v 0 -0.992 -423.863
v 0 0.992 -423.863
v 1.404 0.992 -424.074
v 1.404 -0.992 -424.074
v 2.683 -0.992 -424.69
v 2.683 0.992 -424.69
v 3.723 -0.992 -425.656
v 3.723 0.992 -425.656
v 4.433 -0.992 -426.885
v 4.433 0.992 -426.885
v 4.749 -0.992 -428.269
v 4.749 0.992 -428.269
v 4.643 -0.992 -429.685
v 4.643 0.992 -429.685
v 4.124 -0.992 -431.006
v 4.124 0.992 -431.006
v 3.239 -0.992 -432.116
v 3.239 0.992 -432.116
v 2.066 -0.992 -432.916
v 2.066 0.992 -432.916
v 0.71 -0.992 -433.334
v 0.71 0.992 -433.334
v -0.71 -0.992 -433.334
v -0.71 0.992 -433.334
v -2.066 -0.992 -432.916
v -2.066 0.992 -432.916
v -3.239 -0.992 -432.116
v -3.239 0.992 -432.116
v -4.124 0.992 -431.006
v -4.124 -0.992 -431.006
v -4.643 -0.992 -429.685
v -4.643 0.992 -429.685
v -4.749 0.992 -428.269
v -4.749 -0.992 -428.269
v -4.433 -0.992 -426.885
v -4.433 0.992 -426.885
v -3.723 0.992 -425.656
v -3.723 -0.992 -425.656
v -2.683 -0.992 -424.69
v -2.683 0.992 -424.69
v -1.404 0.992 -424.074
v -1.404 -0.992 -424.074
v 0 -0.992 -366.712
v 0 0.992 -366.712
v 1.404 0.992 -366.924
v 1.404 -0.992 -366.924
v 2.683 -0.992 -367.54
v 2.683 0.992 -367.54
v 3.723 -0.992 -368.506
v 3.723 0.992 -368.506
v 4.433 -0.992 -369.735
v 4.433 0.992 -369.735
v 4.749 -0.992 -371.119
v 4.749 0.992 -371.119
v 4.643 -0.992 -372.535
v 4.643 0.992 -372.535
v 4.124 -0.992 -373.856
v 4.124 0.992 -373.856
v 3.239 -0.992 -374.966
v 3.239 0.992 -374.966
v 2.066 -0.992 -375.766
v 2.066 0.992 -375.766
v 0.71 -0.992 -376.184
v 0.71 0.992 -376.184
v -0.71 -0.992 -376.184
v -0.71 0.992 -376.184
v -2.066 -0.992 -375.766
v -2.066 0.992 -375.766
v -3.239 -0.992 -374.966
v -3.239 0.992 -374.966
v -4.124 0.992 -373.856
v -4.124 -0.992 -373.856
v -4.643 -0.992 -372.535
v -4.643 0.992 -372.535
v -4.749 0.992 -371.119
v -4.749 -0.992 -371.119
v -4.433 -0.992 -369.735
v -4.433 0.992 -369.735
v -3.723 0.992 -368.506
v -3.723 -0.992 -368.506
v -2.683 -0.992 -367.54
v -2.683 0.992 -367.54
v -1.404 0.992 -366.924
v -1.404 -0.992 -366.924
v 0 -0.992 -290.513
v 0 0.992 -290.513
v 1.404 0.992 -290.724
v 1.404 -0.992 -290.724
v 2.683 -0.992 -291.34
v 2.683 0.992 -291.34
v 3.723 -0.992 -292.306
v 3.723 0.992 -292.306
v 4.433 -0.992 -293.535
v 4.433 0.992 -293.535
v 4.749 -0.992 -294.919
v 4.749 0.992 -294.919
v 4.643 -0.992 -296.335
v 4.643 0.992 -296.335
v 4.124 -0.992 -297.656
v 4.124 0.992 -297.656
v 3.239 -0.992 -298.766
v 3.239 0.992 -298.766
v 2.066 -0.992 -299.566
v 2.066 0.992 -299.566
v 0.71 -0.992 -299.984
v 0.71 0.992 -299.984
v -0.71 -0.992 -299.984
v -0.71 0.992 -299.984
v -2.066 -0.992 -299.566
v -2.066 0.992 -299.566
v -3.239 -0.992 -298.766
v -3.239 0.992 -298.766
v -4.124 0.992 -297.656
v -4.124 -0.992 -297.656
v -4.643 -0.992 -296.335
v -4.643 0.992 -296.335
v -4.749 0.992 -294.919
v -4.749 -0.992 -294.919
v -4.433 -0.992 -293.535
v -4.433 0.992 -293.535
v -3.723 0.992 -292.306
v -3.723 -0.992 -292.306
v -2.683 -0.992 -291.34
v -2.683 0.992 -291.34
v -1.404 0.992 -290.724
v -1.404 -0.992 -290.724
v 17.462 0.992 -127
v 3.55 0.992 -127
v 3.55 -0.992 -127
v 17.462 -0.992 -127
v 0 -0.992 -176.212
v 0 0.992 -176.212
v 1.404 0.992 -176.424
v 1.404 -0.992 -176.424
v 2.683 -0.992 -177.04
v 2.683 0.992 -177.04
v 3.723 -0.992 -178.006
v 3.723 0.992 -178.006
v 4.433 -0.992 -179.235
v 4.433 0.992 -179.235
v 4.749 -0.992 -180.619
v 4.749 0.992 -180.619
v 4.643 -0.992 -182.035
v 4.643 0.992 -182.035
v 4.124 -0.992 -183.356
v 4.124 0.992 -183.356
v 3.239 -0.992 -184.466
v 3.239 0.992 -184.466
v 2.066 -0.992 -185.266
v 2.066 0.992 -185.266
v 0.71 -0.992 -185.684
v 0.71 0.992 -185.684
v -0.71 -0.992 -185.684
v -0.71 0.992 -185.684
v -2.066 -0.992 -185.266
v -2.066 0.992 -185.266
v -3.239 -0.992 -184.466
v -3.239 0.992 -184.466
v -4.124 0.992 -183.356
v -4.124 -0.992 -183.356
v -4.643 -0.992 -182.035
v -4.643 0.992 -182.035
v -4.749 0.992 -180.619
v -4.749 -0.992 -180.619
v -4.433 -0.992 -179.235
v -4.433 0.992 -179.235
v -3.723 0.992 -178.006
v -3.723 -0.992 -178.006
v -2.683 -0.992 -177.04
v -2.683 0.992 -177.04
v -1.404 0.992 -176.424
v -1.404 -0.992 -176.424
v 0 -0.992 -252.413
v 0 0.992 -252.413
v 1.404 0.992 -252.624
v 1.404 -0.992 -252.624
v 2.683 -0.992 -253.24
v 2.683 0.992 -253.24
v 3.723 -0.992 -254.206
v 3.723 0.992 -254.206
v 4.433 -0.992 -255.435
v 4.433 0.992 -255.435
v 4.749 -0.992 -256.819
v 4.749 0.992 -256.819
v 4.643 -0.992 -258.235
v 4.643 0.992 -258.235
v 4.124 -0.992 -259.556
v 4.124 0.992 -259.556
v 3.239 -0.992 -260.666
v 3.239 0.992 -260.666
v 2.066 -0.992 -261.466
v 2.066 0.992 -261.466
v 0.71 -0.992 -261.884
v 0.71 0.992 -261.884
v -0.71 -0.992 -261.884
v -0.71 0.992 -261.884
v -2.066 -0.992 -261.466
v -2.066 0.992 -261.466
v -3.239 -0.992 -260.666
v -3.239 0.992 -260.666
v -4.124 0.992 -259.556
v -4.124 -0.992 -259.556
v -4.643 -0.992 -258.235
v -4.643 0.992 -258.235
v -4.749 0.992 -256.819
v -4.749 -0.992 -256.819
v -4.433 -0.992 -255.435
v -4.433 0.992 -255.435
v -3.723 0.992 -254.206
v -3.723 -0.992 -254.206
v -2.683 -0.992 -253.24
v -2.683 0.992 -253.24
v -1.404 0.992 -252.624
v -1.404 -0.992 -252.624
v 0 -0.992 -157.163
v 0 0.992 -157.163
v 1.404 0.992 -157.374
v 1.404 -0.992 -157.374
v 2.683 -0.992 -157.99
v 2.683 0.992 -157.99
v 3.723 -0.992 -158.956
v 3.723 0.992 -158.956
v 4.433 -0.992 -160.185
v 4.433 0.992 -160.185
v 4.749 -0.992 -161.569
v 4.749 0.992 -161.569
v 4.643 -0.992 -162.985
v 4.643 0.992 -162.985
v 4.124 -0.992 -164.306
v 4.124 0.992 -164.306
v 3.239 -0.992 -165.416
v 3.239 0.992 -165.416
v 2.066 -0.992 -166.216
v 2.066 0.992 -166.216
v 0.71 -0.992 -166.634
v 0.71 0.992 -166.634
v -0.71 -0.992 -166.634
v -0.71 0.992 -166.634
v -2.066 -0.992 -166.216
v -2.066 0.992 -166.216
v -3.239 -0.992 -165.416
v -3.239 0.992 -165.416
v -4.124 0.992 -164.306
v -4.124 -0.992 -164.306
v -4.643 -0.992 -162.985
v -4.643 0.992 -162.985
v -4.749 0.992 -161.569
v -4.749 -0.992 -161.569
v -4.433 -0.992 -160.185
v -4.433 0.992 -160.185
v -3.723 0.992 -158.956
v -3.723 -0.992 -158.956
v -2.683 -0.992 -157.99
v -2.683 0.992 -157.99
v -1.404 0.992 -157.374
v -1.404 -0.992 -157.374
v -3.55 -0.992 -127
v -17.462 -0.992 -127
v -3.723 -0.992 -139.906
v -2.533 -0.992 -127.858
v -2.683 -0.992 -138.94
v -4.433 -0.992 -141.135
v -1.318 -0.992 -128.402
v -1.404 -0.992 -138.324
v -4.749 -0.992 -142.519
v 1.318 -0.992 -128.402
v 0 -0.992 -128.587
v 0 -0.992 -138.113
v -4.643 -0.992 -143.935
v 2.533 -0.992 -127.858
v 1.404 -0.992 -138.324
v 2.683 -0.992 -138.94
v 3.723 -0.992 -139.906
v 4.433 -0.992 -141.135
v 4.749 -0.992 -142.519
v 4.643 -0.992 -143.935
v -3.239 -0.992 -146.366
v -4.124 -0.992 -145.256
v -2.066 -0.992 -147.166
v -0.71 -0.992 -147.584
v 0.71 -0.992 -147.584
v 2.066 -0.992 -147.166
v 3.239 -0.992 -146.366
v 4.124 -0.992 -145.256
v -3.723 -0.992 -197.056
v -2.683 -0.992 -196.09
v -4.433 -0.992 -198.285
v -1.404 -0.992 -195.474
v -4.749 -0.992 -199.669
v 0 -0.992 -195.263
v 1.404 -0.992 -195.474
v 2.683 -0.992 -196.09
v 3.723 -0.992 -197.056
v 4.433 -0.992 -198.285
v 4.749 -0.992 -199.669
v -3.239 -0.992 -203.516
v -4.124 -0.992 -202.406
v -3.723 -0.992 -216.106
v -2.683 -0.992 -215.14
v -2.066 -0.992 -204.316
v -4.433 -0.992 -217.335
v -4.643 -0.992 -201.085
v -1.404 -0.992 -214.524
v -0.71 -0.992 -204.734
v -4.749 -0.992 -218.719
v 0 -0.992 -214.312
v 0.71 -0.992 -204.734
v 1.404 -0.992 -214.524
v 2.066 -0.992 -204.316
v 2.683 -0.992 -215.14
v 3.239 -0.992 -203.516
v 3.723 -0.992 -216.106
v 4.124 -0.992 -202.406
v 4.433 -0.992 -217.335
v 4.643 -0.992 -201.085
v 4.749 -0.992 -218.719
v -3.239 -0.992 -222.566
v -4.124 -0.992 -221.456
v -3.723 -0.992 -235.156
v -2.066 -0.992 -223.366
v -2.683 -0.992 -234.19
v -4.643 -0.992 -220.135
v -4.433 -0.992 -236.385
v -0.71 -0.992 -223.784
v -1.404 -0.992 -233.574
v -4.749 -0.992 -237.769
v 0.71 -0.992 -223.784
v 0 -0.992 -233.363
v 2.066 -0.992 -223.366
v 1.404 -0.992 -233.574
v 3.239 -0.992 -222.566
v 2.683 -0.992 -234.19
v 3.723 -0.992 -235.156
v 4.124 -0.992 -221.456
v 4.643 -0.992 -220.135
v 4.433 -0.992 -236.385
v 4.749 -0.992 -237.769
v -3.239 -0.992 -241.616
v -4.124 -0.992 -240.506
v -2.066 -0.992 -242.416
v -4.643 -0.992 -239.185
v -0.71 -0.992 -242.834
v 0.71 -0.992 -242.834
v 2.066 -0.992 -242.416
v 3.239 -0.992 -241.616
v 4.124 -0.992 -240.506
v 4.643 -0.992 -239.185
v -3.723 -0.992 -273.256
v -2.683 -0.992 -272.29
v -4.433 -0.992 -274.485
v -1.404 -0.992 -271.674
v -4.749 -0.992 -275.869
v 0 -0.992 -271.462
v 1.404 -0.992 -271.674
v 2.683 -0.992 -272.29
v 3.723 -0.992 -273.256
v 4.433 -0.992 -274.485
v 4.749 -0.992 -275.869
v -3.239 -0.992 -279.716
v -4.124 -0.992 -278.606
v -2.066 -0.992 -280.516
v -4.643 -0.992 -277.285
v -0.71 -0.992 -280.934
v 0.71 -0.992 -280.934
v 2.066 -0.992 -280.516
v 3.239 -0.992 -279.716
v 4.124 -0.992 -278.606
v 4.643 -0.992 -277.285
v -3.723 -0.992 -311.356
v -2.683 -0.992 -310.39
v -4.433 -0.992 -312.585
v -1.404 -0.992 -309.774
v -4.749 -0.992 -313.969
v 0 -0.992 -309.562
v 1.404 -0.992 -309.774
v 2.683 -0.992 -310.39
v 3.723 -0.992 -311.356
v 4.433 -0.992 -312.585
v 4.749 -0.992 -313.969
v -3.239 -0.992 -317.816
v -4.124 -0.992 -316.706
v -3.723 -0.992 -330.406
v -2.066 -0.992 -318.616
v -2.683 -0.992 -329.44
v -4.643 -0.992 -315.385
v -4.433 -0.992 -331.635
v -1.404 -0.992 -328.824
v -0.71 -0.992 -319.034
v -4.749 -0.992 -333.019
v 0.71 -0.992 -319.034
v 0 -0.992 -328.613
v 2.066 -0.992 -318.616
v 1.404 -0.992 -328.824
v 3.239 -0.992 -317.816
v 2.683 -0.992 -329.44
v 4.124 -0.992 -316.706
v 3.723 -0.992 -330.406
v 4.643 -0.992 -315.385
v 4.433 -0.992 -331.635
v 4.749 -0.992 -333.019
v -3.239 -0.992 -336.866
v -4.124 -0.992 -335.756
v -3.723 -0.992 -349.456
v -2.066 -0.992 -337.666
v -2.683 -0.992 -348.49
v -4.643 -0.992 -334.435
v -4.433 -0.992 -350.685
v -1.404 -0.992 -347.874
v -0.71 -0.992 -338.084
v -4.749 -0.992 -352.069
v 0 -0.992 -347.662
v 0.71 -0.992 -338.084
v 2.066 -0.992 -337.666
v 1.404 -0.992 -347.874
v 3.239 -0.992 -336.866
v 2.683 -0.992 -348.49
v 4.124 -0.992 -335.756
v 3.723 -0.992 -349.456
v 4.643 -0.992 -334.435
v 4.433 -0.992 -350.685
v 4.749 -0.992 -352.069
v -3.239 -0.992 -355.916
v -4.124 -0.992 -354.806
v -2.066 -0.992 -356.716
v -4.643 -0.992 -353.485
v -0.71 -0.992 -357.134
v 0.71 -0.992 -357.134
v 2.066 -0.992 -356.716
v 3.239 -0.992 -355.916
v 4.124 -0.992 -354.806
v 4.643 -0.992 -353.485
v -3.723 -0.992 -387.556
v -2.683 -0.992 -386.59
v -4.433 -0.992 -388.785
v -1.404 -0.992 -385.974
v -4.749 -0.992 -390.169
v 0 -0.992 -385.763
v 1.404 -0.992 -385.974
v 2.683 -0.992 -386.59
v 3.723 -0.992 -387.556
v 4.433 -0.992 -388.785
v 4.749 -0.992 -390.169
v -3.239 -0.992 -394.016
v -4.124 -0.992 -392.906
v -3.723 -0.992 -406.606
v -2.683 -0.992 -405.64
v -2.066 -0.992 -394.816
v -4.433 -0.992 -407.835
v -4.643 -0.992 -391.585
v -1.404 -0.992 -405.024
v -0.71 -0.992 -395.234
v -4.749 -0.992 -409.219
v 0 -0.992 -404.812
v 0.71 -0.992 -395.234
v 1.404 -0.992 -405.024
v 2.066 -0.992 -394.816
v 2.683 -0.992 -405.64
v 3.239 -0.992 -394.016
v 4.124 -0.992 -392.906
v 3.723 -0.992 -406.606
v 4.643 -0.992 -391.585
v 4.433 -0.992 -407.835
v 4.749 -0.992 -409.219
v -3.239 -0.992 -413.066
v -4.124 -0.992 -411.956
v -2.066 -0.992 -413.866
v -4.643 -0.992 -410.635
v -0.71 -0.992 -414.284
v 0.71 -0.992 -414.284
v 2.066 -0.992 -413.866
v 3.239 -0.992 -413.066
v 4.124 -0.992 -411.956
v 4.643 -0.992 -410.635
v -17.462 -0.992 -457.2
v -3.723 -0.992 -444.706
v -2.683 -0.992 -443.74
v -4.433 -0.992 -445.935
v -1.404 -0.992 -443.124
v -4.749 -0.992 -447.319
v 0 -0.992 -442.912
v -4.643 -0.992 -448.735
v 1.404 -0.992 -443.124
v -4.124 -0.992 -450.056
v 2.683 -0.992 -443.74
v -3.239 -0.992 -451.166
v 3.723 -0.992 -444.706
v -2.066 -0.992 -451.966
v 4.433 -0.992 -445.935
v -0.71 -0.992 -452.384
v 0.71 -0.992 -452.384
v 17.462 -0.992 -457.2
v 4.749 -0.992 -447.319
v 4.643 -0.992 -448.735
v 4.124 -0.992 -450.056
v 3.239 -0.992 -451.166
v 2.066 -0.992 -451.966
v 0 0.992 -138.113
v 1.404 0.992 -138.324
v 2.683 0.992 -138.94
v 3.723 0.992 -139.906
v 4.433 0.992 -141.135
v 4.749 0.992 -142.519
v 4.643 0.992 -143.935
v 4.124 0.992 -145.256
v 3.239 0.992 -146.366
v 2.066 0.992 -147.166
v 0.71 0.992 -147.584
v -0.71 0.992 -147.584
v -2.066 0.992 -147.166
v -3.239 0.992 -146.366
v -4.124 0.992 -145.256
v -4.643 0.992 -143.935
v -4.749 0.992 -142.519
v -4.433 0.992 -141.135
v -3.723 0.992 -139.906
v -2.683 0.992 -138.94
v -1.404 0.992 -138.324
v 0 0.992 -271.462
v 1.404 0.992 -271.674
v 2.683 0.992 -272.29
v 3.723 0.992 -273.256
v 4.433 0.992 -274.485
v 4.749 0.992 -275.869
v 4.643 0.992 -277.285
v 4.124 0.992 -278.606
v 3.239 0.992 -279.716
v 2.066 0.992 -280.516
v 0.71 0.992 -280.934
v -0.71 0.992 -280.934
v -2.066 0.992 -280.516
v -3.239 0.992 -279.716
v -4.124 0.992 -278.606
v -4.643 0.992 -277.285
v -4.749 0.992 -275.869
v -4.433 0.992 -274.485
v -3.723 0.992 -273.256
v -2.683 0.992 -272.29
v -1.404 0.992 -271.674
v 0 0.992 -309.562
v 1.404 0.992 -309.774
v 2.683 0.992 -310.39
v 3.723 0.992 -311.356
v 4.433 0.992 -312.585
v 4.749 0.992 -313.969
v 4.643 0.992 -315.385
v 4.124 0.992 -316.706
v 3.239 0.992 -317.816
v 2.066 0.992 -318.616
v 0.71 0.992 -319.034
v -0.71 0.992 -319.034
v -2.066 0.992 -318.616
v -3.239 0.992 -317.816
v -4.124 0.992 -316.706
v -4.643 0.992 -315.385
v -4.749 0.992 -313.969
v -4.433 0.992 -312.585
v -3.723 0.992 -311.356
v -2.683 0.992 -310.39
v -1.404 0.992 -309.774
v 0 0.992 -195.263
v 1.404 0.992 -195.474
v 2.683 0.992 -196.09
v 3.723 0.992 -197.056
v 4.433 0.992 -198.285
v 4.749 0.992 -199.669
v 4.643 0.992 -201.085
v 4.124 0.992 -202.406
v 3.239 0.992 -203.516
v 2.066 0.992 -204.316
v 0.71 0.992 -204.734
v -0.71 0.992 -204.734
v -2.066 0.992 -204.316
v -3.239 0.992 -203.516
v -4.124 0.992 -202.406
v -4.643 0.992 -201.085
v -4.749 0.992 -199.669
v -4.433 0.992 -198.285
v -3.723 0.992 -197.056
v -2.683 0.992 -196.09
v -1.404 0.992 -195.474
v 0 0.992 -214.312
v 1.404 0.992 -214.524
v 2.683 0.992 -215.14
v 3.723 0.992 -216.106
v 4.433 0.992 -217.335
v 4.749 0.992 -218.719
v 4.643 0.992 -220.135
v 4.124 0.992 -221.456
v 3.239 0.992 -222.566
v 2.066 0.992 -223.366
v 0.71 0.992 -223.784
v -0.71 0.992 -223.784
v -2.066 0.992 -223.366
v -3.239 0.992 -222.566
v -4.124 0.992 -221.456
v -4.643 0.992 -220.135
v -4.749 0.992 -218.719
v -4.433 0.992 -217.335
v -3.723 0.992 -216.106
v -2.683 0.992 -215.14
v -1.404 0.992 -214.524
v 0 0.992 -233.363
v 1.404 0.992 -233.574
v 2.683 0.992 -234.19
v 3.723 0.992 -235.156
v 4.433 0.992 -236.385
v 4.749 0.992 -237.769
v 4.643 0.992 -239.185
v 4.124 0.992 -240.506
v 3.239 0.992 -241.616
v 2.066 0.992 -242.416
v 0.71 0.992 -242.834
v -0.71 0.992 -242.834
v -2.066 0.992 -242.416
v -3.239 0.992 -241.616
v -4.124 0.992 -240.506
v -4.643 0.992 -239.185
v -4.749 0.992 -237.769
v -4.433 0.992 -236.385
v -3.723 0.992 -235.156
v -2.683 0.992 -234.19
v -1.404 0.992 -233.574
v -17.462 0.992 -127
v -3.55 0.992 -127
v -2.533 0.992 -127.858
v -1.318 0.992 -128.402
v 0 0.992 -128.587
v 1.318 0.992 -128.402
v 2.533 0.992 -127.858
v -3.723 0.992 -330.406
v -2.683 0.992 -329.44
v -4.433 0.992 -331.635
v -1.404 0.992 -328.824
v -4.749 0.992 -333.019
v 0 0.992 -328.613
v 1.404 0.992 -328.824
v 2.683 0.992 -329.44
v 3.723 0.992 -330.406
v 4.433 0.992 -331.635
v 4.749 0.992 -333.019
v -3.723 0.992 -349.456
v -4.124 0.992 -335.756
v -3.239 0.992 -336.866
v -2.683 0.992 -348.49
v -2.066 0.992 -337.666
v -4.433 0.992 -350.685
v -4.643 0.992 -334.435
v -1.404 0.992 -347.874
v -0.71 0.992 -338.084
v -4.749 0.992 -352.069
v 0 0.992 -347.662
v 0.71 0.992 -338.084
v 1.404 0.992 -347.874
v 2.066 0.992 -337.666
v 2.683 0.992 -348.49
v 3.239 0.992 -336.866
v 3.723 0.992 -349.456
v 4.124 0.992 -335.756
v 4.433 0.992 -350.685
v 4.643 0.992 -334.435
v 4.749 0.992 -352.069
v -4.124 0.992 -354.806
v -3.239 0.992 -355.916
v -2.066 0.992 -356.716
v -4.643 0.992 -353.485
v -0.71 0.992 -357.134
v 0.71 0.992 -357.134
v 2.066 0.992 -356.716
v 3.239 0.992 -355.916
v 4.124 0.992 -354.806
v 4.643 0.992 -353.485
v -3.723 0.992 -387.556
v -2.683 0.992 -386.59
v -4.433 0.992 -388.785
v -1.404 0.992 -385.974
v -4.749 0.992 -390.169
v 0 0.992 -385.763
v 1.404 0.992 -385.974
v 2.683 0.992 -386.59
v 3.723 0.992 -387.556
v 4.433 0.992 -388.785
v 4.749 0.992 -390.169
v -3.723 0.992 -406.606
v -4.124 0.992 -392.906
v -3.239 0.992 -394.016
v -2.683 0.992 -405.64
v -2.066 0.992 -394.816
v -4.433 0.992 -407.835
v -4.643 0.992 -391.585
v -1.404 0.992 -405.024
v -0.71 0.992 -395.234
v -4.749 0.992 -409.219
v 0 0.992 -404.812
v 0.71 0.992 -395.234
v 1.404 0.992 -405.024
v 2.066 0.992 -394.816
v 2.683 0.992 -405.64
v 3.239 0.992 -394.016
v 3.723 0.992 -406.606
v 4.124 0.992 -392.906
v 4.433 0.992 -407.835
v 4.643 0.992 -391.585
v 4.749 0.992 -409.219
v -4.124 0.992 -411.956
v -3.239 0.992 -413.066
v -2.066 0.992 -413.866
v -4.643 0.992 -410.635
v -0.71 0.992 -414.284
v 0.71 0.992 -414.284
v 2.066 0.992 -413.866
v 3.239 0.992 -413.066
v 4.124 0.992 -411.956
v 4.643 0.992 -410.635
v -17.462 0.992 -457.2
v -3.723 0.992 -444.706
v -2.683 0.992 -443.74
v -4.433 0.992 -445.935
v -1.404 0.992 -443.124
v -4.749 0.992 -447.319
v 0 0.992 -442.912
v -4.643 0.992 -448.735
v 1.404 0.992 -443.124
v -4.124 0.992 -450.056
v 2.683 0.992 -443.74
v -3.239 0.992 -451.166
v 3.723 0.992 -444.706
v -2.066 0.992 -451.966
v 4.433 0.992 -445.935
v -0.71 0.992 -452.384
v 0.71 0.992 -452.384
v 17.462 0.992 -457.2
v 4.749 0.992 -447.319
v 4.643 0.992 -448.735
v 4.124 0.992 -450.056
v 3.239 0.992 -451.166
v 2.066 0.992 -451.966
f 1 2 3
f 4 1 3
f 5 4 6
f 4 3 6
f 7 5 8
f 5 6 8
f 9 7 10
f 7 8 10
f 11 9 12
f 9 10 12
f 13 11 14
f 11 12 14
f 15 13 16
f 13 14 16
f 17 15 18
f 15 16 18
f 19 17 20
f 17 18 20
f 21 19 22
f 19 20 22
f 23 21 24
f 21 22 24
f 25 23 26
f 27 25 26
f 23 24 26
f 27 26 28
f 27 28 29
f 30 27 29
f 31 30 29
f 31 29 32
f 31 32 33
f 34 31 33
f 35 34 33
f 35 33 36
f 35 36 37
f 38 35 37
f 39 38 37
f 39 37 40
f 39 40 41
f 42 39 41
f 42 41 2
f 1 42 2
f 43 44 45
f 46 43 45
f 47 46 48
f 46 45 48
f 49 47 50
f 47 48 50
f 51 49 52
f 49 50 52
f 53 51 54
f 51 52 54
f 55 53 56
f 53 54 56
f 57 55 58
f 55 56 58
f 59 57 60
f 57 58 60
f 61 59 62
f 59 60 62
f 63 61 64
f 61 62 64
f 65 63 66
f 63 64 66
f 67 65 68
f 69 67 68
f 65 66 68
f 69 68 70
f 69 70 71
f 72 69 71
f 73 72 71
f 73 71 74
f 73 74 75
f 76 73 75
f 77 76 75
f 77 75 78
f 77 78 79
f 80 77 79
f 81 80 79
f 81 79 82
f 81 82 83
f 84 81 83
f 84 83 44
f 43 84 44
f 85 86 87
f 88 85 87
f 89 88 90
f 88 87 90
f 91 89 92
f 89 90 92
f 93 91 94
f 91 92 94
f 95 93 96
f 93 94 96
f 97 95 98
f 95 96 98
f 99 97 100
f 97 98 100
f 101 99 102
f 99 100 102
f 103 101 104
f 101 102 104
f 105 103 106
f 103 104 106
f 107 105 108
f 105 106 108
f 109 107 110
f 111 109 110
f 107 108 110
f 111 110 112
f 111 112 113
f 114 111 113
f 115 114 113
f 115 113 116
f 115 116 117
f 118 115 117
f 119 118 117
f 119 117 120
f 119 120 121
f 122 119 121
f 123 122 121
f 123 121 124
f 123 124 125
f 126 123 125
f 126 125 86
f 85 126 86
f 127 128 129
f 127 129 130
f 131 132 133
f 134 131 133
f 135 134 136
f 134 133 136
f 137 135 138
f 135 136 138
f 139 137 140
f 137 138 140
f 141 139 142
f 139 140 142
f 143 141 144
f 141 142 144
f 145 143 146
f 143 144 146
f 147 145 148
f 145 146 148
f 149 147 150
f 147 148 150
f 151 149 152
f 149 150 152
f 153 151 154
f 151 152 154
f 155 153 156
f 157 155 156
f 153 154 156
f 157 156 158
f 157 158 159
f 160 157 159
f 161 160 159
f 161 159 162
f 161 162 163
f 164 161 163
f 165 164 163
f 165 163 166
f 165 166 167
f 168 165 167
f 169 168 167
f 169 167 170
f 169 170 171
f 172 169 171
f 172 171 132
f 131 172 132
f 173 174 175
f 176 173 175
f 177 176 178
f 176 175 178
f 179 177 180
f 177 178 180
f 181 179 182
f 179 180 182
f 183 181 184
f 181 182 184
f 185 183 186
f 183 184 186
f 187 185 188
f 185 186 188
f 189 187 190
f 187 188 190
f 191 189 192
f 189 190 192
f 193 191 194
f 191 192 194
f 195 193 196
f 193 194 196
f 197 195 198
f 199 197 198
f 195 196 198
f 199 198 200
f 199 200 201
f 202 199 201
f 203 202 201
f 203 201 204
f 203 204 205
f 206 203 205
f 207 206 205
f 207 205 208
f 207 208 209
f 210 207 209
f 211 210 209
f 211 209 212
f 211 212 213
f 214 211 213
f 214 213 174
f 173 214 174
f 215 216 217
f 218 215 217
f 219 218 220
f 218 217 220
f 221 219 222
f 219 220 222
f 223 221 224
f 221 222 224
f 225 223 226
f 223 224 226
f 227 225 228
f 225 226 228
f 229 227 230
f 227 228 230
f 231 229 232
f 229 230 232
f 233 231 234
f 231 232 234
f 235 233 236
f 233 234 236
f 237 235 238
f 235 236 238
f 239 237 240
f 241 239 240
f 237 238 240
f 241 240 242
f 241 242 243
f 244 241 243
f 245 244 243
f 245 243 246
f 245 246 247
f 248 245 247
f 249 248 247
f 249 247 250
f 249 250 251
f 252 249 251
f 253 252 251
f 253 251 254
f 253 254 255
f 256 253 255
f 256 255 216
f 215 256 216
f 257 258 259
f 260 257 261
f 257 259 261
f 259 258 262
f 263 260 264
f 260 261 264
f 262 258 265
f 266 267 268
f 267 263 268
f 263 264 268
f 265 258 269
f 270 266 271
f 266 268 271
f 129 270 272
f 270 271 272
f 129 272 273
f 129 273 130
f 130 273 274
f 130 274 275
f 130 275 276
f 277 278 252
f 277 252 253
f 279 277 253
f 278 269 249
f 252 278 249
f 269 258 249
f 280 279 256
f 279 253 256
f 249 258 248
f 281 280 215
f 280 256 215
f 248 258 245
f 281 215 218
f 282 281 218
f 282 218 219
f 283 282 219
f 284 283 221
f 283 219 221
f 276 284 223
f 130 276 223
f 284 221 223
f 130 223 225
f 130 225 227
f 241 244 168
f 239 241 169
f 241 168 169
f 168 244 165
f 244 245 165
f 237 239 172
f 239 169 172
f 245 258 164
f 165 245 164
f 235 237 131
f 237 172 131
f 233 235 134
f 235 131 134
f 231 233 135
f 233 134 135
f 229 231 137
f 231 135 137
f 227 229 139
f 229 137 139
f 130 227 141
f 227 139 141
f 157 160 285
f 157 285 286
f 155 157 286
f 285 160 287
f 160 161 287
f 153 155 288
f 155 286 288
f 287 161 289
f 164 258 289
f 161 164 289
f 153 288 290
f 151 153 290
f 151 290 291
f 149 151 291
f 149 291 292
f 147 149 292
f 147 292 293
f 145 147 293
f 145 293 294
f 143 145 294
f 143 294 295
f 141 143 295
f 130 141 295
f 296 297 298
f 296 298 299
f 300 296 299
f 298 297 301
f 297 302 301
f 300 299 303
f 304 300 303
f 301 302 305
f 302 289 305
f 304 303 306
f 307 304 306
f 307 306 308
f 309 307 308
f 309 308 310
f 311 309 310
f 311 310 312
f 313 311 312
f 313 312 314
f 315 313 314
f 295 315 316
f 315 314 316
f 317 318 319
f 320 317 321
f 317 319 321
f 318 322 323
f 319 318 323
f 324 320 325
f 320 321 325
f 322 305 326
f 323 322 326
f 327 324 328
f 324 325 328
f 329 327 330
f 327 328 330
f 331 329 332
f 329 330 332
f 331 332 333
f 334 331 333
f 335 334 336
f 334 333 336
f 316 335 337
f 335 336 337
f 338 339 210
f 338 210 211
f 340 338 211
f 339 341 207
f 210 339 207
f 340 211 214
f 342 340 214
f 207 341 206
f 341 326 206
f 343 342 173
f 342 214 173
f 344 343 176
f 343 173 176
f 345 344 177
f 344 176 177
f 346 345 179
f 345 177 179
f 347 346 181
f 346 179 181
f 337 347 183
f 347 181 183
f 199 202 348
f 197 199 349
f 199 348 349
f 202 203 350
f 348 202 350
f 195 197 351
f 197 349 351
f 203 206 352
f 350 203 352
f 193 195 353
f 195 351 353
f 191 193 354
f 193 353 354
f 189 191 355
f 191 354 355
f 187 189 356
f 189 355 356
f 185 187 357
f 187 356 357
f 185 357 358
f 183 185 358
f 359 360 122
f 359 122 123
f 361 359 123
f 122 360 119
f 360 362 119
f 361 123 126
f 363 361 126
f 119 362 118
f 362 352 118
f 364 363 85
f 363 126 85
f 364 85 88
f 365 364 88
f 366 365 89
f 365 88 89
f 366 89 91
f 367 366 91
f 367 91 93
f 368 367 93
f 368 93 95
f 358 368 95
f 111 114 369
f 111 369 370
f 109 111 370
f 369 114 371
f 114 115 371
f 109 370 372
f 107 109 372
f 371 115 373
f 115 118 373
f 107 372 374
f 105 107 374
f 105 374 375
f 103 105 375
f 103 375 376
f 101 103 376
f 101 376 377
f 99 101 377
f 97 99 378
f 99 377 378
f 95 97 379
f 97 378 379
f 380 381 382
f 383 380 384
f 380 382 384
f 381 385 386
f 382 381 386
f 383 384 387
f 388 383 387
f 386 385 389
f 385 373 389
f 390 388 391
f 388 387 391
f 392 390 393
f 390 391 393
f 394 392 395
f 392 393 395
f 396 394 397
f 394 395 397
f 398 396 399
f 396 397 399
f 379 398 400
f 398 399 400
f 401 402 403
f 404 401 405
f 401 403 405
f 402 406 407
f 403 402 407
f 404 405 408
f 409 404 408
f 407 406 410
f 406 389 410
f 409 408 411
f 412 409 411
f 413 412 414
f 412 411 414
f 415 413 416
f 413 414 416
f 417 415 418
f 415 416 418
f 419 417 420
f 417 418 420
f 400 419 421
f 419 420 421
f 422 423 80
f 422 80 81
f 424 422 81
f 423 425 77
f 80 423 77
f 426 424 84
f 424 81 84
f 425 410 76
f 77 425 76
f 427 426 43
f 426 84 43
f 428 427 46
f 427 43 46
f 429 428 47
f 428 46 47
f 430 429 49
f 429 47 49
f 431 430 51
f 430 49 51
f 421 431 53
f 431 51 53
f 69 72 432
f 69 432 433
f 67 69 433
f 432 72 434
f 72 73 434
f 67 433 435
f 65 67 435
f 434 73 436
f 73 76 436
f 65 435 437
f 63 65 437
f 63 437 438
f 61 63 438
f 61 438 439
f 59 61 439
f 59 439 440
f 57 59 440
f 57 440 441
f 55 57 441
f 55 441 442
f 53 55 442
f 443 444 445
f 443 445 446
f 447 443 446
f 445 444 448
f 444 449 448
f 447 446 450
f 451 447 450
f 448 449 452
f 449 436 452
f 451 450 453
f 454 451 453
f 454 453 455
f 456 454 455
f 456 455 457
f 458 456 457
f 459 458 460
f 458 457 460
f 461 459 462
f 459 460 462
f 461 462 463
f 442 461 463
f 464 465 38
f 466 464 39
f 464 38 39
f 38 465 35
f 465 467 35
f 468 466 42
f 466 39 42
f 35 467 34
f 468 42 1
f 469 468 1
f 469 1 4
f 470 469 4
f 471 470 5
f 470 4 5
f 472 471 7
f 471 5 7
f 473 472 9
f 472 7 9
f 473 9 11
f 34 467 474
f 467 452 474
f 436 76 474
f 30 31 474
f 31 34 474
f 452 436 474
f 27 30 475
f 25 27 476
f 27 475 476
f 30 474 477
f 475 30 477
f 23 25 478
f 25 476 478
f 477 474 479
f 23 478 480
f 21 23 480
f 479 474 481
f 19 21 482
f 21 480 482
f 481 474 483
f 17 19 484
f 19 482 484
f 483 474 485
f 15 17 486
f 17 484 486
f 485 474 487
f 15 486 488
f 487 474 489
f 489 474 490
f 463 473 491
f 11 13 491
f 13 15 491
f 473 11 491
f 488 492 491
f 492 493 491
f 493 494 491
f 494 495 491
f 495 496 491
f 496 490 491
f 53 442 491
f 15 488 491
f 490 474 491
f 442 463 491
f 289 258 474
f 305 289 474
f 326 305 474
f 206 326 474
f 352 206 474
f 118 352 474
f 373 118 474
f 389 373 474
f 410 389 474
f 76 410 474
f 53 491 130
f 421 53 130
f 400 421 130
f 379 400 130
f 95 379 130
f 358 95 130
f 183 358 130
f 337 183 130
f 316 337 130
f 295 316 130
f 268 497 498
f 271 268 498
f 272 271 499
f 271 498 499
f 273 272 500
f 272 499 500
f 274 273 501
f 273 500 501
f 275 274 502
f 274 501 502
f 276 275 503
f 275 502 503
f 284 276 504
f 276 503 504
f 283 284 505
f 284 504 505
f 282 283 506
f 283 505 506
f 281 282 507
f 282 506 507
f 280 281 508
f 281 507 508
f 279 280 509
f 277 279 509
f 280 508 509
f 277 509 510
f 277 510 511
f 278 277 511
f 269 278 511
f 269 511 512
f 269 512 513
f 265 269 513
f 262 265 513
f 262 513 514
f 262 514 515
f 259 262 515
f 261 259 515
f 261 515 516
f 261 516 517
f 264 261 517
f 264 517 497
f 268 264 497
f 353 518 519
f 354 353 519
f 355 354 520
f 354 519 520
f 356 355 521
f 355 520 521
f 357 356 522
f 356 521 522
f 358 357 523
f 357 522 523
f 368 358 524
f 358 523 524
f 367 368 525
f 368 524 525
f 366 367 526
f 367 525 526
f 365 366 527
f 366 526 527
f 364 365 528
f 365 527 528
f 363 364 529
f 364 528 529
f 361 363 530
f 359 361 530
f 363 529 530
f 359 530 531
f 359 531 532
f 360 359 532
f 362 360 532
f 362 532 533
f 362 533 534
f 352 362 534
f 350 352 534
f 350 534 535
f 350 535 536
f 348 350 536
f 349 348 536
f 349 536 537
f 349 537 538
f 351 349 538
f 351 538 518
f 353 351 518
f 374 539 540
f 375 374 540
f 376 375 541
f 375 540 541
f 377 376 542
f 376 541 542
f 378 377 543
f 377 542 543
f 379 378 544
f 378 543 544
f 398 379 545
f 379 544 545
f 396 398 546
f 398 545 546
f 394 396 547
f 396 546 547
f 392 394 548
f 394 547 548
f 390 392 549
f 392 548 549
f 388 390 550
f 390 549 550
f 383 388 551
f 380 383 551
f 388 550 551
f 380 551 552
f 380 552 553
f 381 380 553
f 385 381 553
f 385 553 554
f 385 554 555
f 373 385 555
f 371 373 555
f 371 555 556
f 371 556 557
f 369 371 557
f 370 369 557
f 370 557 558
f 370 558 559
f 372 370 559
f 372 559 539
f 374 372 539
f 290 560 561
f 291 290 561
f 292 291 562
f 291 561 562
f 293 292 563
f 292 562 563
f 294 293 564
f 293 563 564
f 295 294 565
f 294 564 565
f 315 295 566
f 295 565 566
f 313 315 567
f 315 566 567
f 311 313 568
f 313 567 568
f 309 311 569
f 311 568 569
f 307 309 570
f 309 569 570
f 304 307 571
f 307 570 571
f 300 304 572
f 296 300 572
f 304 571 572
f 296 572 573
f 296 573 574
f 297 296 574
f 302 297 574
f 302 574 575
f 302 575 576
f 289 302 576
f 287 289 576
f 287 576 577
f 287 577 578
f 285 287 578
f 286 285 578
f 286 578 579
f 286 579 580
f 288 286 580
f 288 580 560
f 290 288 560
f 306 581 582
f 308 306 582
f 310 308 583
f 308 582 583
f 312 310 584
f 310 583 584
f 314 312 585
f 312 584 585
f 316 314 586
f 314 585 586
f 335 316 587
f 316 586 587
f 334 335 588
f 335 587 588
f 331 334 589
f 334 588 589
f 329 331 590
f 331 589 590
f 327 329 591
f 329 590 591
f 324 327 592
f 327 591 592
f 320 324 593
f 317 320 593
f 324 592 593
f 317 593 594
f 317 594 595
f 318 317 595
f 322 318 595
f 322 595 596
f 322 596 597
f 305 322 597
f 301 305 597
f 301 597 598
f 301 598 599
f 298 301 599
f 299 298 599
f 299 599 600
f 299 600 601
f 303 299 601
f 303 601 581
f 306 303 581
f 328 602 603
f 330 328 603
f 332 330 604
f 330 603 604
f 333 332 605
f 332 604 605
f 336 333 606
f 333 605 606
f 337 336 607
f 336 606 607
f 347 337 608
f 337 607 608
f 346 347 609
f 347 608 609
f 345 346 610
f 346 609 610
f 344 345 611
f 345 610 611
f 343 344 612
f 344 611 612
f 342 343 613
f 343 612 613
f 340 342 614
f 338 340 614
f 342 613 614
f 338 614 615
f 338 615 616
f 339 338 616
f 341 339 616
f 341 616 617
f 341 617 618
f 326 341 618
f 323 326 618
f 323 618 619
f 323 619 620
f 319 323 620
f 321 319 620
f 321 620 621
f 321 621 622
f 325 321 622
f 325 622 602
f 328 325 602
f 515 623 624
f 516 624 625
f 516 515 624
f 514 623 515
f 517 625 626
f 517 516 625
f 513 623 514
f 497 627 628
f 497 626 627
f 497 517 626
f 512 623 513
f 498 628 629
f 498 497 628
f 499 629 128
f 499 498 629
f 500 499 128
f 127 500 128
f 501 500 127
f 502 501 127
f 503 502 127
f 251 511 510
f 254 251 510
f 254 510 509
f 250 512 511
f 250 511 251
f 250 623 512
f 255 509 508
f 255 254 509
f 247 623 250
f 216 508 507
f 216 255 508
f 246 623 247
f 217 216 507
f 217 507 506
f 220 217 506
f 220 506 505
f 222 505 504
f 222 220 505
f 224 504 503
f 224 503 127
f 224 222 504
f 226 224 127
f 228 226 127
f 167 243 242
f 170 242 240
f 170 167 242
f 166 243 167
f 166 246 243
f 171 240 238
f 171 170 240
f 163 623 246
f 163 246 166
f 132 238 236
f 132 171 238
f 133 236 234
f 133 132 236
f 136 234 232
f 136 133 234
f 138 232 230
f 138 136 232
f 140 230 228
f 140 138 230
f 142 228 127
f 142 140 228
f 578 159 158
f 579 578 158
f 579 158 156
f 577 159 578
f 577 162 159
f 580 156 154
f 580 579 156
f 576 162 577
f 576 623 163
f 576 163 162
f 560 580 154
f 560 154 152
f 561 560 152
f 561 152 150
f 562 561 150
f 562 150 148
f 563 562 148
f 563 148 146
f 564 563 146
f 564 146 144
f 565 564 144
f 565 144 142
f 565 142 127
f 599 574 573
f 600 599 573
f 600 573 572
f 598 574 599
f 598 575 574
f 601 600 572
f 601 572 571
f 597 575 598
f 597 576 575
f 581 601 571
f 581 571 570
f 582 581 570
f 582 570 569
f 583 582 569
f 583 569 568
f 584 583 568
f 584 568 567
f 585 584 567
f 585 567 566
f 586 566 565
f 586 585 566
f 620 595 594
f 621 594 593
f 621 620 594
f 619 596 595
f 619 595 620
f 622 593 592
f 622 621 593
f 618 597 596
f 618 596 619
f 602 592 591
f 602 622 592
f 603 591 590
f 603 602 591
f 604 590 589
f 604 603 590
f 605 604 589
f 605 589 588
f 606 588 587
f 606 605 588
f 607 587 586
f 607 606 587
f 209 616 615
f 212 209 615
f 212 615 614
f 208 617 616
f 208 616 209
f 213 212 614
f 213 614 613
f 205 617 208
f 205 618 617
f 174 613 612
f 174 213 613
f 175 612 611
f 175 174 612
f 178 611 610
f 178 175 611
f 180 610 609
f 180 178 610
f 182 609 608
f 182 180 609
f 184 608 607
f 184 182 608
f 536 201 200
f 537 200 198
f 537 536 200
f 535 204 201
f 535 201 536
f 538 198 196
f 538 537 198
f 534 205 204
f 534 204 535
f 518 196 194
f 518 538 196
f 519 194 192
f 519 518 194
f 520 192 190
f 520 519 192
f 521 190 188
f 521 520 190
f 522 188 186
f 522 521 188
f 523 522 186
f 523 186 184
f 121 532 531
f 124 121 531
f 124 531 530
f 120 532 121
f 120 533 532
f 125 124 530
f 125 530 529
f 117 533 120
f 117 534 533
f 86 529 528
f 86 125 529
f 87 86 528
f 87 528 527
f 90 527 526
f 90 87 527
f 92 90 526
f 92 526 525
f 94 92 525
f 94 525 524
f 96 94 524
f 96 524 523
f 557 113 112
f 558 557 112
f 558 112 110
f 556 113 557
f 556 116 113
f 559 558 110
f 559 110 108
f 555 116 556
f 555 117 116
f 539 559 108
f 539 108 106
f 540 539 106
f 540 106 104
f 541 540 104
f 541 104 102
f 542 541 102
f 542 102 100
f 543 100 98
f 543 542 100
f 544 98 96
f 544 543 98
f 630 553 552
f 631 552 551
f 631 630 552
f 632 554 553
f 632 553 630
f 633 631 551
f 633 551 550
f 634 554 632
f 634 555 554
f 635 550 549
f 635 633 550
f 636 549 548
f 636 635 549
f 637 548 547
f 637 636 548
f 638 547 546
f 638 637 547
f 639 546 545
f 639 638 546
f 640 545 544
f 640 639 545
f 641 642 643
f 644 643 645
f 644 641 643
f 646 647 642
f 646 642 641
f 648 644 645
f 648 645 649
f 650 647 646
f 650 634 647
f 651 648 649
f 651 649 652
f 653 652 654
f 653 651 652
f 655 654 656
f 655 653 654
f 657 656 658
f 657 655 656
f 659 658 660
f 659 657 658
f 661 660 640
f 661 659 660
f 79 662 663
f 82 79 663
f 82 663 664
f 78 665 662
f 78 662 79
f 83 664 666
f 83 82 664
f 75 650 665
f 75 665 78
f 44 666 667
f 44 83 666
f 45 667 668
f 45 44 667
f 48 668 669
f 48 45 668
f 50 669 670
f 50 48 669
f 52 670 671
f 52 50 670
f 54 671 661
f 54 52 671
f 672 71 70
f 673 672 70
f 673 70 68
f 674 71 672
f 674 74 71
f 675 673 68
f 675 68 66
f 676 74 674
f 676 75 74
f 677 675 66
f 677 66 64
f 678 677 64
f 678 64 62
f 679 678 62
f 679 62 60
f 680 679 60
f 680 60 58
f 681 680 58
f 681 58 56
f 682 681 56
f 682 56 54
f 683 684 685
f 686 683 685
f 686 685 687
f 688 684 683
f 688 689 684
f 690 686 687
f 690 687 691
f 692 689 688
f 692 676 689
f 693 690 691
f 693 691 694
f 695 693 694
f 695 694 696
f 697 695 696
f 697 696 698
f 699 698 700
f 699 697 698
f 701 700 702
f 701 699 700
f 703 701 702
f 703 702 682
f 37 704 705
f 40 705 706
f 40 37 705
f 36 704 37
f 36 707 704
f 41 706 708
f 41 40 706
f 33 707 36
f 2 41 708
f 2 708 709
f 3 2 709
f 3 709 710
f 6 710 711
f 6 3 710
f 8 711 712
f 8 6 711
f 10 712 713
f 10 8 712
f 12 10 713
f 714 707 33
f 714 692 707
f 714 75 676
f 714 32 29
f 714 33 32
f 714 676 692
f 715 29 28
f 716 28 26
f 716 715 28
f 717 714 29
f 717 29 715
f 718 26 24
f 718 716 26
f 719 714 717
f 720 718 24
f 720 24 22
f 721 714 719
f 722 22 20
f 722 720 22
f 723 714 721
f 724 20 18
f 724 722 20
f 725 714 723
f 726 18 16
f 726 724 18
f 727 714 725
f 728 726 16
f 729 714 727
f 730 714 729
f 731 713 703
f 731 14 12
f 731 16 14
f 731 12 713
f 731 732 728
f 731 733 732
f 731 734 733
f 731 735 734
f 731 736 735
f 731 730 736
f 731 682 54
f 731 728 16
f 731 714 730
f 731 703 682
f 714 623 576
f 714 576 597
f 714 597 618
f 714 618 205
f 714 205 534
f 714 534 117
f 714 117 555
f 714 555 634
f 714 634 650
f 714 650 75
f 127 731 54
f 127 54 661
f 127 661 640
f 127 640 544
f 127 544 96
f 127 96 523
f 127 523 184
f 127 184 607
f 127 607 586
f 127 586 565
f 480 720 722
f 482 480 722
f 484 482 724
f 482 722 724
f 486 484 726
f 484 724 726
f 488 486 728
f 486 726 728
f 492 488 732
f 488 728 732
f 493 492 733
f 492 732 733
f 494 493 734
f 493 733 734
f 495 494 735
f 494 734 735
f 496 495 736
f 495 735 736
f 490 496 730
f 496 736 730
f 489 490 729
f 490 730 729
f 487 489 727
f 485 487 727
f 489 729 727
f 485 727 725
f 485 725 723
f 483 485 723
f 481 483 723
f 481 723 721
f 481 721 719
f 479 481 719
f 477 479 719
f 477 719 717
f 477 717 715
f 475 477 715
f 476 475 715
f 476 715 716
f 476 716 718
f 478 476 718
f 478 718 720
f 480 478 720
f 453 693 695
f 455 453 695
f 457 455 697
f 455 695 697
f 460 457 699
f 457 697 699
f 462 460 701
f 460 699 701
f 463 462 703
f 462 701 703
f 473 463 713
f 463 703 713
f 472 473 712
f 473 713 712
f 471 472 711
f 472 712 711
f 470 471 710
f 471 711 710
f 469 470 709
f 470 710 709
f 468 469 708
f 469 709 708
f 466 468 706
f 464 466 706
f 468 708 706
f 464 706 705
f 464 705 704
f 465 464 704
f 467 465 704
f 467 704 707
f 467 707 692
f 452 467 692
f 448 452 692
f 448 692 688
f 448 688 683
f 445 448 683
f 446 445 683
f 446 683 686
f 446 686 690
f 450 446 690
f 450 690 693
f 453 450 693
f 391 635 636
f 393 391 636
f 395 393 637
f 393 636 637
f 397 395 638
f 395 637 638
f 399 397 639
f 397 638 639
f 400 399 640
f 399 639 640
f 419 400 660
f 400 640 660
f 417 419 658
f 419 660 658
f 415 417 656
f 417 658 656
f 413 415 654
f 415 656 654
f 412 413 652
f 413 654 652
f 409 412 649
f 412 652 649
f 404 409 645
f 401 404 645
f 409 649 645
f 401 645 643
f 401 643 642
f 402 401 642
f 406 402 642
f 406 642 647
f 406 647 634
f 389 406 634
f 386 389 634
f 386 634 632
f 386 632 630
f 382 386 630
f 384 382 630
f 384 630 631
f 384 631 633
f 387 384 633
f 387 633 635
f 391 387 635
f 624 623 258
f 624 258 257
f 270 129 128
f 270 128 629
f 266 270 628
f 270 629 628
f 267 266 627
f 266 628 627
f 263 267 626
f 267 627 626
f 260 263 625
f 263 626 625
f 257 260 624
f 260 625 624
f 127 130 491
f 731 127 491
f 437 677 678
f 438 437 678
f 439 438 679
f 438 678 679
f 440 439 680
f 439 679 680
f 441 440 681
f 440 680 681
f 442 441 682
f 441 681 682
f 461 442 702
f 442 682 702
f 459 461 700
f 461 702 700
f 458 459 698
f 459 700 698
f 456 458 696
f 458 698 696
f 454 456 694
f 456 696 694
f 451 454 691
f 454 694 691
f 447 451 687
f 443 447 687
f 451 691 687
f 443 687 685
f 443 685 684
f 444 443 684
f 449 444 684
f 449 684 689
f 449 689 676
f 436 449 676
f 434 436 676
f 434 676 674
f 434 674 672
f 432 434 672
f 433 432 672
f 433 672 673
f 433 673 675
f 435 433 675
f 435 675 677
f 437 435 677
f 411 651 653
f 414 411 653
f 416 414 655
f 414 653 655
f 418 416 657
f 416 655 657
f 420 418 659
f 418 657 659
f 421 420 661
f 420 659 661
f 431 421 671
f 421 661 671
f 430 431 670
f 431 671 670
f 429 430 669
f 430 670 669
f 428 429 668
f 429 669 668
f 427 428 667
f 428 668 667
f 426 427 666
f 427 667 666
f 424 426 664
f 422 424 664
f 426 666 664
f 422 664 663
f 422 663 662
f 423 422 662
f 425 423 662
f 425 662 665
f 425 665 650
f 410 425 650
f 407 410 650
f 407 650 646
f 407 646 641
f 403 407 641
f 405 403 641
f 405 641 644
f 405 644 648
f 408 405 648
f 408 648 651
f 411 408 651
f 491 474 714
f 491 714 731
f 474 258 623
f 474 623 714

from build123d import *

# Parameters (mm, degrees)
BOSS_EXTRUDE1_DEPTH      = 0.99187
BOSS_EXTRUDE1_DEPTH_BACK = 0.99187
SKETCH3_W                = 34.925
SKETCH3_H                = 914.4
CUT_EXTRUDE1_REACH       = 459.538
SKETCH4_R                = 4.7625
LPATTERN1_COUNT          = 53
LPATTERN1_PITCH          = 19.05
SKETCH5_W                = 34.925
SKETCH5_H                = 1.98374
CUT_EXTRUDE2_DEPTH       = 584.2


with BuildPart() as part:
    # Sketch3 → Boss-Extrude1 (new, two sides: drawn at the far end of the back side and taken through both)
    with BuildSketch(Plane(origin=(0, 0, 0), x_dir=(1, 0, 0), z_dir=(0, 1, 0)).offset(-BOSS_EXTRUDE1_DEPTH_BACK)):
        Rectangle(SKETCH3_W, SKETCH3_H)
    extrude(amount=BOSS_EXTRUDE1_DEPTH + BOSS_EXTRUDE1_DEPTH_BACK)

    # Sketch4 → Cut-Extrude1 (cut, up to next)
    with BuildSketch(Plane(origin=(0, 0.99187, 0), x_dir=(1, 0, 0), z_dir=(0, 1, 0)), mode=Mode.PRIVATE) as cut_extrude1_sk1:
        with Locations(Location((0, -447.675, 0), (0, 0, 270))):
            Circle(SKETCH4_R)
    cut_extrude1_tool1 = extrude(cut_extrude1_sk1.sketch, amount=-CUT_EXTRUDE1_REACH, mode=Mode.PRIVATE) & part.part
    cut_extrude1 = cut_extrude1_tool1.solids().sort_by_distance((0, 0.99187, 447.675))[0]
    add(cut_extrude1, mode=Mode.SUBTRACT)

    # LPattern1: Cut-Extrude1 ×53
    with Locations(*[(0, 0, -i * LPATTERN1_PITCH) for i in range(1, LPATTERN1_COUNT)]):
        add(cut_extrude1, mode=Mode.SUBTRACT)

    # Sketch5 → Cut-Extrude2 (cut)
    with BuildSketch(Plane.XY.offset(457.2)):
        Rectangle(SKETCH5_W, SKETCH5_H)
    extrude(amount=-CUT_EXTRUDE2_DEPTH, mode=Mode.SUBTRACT)


solid = part.part
